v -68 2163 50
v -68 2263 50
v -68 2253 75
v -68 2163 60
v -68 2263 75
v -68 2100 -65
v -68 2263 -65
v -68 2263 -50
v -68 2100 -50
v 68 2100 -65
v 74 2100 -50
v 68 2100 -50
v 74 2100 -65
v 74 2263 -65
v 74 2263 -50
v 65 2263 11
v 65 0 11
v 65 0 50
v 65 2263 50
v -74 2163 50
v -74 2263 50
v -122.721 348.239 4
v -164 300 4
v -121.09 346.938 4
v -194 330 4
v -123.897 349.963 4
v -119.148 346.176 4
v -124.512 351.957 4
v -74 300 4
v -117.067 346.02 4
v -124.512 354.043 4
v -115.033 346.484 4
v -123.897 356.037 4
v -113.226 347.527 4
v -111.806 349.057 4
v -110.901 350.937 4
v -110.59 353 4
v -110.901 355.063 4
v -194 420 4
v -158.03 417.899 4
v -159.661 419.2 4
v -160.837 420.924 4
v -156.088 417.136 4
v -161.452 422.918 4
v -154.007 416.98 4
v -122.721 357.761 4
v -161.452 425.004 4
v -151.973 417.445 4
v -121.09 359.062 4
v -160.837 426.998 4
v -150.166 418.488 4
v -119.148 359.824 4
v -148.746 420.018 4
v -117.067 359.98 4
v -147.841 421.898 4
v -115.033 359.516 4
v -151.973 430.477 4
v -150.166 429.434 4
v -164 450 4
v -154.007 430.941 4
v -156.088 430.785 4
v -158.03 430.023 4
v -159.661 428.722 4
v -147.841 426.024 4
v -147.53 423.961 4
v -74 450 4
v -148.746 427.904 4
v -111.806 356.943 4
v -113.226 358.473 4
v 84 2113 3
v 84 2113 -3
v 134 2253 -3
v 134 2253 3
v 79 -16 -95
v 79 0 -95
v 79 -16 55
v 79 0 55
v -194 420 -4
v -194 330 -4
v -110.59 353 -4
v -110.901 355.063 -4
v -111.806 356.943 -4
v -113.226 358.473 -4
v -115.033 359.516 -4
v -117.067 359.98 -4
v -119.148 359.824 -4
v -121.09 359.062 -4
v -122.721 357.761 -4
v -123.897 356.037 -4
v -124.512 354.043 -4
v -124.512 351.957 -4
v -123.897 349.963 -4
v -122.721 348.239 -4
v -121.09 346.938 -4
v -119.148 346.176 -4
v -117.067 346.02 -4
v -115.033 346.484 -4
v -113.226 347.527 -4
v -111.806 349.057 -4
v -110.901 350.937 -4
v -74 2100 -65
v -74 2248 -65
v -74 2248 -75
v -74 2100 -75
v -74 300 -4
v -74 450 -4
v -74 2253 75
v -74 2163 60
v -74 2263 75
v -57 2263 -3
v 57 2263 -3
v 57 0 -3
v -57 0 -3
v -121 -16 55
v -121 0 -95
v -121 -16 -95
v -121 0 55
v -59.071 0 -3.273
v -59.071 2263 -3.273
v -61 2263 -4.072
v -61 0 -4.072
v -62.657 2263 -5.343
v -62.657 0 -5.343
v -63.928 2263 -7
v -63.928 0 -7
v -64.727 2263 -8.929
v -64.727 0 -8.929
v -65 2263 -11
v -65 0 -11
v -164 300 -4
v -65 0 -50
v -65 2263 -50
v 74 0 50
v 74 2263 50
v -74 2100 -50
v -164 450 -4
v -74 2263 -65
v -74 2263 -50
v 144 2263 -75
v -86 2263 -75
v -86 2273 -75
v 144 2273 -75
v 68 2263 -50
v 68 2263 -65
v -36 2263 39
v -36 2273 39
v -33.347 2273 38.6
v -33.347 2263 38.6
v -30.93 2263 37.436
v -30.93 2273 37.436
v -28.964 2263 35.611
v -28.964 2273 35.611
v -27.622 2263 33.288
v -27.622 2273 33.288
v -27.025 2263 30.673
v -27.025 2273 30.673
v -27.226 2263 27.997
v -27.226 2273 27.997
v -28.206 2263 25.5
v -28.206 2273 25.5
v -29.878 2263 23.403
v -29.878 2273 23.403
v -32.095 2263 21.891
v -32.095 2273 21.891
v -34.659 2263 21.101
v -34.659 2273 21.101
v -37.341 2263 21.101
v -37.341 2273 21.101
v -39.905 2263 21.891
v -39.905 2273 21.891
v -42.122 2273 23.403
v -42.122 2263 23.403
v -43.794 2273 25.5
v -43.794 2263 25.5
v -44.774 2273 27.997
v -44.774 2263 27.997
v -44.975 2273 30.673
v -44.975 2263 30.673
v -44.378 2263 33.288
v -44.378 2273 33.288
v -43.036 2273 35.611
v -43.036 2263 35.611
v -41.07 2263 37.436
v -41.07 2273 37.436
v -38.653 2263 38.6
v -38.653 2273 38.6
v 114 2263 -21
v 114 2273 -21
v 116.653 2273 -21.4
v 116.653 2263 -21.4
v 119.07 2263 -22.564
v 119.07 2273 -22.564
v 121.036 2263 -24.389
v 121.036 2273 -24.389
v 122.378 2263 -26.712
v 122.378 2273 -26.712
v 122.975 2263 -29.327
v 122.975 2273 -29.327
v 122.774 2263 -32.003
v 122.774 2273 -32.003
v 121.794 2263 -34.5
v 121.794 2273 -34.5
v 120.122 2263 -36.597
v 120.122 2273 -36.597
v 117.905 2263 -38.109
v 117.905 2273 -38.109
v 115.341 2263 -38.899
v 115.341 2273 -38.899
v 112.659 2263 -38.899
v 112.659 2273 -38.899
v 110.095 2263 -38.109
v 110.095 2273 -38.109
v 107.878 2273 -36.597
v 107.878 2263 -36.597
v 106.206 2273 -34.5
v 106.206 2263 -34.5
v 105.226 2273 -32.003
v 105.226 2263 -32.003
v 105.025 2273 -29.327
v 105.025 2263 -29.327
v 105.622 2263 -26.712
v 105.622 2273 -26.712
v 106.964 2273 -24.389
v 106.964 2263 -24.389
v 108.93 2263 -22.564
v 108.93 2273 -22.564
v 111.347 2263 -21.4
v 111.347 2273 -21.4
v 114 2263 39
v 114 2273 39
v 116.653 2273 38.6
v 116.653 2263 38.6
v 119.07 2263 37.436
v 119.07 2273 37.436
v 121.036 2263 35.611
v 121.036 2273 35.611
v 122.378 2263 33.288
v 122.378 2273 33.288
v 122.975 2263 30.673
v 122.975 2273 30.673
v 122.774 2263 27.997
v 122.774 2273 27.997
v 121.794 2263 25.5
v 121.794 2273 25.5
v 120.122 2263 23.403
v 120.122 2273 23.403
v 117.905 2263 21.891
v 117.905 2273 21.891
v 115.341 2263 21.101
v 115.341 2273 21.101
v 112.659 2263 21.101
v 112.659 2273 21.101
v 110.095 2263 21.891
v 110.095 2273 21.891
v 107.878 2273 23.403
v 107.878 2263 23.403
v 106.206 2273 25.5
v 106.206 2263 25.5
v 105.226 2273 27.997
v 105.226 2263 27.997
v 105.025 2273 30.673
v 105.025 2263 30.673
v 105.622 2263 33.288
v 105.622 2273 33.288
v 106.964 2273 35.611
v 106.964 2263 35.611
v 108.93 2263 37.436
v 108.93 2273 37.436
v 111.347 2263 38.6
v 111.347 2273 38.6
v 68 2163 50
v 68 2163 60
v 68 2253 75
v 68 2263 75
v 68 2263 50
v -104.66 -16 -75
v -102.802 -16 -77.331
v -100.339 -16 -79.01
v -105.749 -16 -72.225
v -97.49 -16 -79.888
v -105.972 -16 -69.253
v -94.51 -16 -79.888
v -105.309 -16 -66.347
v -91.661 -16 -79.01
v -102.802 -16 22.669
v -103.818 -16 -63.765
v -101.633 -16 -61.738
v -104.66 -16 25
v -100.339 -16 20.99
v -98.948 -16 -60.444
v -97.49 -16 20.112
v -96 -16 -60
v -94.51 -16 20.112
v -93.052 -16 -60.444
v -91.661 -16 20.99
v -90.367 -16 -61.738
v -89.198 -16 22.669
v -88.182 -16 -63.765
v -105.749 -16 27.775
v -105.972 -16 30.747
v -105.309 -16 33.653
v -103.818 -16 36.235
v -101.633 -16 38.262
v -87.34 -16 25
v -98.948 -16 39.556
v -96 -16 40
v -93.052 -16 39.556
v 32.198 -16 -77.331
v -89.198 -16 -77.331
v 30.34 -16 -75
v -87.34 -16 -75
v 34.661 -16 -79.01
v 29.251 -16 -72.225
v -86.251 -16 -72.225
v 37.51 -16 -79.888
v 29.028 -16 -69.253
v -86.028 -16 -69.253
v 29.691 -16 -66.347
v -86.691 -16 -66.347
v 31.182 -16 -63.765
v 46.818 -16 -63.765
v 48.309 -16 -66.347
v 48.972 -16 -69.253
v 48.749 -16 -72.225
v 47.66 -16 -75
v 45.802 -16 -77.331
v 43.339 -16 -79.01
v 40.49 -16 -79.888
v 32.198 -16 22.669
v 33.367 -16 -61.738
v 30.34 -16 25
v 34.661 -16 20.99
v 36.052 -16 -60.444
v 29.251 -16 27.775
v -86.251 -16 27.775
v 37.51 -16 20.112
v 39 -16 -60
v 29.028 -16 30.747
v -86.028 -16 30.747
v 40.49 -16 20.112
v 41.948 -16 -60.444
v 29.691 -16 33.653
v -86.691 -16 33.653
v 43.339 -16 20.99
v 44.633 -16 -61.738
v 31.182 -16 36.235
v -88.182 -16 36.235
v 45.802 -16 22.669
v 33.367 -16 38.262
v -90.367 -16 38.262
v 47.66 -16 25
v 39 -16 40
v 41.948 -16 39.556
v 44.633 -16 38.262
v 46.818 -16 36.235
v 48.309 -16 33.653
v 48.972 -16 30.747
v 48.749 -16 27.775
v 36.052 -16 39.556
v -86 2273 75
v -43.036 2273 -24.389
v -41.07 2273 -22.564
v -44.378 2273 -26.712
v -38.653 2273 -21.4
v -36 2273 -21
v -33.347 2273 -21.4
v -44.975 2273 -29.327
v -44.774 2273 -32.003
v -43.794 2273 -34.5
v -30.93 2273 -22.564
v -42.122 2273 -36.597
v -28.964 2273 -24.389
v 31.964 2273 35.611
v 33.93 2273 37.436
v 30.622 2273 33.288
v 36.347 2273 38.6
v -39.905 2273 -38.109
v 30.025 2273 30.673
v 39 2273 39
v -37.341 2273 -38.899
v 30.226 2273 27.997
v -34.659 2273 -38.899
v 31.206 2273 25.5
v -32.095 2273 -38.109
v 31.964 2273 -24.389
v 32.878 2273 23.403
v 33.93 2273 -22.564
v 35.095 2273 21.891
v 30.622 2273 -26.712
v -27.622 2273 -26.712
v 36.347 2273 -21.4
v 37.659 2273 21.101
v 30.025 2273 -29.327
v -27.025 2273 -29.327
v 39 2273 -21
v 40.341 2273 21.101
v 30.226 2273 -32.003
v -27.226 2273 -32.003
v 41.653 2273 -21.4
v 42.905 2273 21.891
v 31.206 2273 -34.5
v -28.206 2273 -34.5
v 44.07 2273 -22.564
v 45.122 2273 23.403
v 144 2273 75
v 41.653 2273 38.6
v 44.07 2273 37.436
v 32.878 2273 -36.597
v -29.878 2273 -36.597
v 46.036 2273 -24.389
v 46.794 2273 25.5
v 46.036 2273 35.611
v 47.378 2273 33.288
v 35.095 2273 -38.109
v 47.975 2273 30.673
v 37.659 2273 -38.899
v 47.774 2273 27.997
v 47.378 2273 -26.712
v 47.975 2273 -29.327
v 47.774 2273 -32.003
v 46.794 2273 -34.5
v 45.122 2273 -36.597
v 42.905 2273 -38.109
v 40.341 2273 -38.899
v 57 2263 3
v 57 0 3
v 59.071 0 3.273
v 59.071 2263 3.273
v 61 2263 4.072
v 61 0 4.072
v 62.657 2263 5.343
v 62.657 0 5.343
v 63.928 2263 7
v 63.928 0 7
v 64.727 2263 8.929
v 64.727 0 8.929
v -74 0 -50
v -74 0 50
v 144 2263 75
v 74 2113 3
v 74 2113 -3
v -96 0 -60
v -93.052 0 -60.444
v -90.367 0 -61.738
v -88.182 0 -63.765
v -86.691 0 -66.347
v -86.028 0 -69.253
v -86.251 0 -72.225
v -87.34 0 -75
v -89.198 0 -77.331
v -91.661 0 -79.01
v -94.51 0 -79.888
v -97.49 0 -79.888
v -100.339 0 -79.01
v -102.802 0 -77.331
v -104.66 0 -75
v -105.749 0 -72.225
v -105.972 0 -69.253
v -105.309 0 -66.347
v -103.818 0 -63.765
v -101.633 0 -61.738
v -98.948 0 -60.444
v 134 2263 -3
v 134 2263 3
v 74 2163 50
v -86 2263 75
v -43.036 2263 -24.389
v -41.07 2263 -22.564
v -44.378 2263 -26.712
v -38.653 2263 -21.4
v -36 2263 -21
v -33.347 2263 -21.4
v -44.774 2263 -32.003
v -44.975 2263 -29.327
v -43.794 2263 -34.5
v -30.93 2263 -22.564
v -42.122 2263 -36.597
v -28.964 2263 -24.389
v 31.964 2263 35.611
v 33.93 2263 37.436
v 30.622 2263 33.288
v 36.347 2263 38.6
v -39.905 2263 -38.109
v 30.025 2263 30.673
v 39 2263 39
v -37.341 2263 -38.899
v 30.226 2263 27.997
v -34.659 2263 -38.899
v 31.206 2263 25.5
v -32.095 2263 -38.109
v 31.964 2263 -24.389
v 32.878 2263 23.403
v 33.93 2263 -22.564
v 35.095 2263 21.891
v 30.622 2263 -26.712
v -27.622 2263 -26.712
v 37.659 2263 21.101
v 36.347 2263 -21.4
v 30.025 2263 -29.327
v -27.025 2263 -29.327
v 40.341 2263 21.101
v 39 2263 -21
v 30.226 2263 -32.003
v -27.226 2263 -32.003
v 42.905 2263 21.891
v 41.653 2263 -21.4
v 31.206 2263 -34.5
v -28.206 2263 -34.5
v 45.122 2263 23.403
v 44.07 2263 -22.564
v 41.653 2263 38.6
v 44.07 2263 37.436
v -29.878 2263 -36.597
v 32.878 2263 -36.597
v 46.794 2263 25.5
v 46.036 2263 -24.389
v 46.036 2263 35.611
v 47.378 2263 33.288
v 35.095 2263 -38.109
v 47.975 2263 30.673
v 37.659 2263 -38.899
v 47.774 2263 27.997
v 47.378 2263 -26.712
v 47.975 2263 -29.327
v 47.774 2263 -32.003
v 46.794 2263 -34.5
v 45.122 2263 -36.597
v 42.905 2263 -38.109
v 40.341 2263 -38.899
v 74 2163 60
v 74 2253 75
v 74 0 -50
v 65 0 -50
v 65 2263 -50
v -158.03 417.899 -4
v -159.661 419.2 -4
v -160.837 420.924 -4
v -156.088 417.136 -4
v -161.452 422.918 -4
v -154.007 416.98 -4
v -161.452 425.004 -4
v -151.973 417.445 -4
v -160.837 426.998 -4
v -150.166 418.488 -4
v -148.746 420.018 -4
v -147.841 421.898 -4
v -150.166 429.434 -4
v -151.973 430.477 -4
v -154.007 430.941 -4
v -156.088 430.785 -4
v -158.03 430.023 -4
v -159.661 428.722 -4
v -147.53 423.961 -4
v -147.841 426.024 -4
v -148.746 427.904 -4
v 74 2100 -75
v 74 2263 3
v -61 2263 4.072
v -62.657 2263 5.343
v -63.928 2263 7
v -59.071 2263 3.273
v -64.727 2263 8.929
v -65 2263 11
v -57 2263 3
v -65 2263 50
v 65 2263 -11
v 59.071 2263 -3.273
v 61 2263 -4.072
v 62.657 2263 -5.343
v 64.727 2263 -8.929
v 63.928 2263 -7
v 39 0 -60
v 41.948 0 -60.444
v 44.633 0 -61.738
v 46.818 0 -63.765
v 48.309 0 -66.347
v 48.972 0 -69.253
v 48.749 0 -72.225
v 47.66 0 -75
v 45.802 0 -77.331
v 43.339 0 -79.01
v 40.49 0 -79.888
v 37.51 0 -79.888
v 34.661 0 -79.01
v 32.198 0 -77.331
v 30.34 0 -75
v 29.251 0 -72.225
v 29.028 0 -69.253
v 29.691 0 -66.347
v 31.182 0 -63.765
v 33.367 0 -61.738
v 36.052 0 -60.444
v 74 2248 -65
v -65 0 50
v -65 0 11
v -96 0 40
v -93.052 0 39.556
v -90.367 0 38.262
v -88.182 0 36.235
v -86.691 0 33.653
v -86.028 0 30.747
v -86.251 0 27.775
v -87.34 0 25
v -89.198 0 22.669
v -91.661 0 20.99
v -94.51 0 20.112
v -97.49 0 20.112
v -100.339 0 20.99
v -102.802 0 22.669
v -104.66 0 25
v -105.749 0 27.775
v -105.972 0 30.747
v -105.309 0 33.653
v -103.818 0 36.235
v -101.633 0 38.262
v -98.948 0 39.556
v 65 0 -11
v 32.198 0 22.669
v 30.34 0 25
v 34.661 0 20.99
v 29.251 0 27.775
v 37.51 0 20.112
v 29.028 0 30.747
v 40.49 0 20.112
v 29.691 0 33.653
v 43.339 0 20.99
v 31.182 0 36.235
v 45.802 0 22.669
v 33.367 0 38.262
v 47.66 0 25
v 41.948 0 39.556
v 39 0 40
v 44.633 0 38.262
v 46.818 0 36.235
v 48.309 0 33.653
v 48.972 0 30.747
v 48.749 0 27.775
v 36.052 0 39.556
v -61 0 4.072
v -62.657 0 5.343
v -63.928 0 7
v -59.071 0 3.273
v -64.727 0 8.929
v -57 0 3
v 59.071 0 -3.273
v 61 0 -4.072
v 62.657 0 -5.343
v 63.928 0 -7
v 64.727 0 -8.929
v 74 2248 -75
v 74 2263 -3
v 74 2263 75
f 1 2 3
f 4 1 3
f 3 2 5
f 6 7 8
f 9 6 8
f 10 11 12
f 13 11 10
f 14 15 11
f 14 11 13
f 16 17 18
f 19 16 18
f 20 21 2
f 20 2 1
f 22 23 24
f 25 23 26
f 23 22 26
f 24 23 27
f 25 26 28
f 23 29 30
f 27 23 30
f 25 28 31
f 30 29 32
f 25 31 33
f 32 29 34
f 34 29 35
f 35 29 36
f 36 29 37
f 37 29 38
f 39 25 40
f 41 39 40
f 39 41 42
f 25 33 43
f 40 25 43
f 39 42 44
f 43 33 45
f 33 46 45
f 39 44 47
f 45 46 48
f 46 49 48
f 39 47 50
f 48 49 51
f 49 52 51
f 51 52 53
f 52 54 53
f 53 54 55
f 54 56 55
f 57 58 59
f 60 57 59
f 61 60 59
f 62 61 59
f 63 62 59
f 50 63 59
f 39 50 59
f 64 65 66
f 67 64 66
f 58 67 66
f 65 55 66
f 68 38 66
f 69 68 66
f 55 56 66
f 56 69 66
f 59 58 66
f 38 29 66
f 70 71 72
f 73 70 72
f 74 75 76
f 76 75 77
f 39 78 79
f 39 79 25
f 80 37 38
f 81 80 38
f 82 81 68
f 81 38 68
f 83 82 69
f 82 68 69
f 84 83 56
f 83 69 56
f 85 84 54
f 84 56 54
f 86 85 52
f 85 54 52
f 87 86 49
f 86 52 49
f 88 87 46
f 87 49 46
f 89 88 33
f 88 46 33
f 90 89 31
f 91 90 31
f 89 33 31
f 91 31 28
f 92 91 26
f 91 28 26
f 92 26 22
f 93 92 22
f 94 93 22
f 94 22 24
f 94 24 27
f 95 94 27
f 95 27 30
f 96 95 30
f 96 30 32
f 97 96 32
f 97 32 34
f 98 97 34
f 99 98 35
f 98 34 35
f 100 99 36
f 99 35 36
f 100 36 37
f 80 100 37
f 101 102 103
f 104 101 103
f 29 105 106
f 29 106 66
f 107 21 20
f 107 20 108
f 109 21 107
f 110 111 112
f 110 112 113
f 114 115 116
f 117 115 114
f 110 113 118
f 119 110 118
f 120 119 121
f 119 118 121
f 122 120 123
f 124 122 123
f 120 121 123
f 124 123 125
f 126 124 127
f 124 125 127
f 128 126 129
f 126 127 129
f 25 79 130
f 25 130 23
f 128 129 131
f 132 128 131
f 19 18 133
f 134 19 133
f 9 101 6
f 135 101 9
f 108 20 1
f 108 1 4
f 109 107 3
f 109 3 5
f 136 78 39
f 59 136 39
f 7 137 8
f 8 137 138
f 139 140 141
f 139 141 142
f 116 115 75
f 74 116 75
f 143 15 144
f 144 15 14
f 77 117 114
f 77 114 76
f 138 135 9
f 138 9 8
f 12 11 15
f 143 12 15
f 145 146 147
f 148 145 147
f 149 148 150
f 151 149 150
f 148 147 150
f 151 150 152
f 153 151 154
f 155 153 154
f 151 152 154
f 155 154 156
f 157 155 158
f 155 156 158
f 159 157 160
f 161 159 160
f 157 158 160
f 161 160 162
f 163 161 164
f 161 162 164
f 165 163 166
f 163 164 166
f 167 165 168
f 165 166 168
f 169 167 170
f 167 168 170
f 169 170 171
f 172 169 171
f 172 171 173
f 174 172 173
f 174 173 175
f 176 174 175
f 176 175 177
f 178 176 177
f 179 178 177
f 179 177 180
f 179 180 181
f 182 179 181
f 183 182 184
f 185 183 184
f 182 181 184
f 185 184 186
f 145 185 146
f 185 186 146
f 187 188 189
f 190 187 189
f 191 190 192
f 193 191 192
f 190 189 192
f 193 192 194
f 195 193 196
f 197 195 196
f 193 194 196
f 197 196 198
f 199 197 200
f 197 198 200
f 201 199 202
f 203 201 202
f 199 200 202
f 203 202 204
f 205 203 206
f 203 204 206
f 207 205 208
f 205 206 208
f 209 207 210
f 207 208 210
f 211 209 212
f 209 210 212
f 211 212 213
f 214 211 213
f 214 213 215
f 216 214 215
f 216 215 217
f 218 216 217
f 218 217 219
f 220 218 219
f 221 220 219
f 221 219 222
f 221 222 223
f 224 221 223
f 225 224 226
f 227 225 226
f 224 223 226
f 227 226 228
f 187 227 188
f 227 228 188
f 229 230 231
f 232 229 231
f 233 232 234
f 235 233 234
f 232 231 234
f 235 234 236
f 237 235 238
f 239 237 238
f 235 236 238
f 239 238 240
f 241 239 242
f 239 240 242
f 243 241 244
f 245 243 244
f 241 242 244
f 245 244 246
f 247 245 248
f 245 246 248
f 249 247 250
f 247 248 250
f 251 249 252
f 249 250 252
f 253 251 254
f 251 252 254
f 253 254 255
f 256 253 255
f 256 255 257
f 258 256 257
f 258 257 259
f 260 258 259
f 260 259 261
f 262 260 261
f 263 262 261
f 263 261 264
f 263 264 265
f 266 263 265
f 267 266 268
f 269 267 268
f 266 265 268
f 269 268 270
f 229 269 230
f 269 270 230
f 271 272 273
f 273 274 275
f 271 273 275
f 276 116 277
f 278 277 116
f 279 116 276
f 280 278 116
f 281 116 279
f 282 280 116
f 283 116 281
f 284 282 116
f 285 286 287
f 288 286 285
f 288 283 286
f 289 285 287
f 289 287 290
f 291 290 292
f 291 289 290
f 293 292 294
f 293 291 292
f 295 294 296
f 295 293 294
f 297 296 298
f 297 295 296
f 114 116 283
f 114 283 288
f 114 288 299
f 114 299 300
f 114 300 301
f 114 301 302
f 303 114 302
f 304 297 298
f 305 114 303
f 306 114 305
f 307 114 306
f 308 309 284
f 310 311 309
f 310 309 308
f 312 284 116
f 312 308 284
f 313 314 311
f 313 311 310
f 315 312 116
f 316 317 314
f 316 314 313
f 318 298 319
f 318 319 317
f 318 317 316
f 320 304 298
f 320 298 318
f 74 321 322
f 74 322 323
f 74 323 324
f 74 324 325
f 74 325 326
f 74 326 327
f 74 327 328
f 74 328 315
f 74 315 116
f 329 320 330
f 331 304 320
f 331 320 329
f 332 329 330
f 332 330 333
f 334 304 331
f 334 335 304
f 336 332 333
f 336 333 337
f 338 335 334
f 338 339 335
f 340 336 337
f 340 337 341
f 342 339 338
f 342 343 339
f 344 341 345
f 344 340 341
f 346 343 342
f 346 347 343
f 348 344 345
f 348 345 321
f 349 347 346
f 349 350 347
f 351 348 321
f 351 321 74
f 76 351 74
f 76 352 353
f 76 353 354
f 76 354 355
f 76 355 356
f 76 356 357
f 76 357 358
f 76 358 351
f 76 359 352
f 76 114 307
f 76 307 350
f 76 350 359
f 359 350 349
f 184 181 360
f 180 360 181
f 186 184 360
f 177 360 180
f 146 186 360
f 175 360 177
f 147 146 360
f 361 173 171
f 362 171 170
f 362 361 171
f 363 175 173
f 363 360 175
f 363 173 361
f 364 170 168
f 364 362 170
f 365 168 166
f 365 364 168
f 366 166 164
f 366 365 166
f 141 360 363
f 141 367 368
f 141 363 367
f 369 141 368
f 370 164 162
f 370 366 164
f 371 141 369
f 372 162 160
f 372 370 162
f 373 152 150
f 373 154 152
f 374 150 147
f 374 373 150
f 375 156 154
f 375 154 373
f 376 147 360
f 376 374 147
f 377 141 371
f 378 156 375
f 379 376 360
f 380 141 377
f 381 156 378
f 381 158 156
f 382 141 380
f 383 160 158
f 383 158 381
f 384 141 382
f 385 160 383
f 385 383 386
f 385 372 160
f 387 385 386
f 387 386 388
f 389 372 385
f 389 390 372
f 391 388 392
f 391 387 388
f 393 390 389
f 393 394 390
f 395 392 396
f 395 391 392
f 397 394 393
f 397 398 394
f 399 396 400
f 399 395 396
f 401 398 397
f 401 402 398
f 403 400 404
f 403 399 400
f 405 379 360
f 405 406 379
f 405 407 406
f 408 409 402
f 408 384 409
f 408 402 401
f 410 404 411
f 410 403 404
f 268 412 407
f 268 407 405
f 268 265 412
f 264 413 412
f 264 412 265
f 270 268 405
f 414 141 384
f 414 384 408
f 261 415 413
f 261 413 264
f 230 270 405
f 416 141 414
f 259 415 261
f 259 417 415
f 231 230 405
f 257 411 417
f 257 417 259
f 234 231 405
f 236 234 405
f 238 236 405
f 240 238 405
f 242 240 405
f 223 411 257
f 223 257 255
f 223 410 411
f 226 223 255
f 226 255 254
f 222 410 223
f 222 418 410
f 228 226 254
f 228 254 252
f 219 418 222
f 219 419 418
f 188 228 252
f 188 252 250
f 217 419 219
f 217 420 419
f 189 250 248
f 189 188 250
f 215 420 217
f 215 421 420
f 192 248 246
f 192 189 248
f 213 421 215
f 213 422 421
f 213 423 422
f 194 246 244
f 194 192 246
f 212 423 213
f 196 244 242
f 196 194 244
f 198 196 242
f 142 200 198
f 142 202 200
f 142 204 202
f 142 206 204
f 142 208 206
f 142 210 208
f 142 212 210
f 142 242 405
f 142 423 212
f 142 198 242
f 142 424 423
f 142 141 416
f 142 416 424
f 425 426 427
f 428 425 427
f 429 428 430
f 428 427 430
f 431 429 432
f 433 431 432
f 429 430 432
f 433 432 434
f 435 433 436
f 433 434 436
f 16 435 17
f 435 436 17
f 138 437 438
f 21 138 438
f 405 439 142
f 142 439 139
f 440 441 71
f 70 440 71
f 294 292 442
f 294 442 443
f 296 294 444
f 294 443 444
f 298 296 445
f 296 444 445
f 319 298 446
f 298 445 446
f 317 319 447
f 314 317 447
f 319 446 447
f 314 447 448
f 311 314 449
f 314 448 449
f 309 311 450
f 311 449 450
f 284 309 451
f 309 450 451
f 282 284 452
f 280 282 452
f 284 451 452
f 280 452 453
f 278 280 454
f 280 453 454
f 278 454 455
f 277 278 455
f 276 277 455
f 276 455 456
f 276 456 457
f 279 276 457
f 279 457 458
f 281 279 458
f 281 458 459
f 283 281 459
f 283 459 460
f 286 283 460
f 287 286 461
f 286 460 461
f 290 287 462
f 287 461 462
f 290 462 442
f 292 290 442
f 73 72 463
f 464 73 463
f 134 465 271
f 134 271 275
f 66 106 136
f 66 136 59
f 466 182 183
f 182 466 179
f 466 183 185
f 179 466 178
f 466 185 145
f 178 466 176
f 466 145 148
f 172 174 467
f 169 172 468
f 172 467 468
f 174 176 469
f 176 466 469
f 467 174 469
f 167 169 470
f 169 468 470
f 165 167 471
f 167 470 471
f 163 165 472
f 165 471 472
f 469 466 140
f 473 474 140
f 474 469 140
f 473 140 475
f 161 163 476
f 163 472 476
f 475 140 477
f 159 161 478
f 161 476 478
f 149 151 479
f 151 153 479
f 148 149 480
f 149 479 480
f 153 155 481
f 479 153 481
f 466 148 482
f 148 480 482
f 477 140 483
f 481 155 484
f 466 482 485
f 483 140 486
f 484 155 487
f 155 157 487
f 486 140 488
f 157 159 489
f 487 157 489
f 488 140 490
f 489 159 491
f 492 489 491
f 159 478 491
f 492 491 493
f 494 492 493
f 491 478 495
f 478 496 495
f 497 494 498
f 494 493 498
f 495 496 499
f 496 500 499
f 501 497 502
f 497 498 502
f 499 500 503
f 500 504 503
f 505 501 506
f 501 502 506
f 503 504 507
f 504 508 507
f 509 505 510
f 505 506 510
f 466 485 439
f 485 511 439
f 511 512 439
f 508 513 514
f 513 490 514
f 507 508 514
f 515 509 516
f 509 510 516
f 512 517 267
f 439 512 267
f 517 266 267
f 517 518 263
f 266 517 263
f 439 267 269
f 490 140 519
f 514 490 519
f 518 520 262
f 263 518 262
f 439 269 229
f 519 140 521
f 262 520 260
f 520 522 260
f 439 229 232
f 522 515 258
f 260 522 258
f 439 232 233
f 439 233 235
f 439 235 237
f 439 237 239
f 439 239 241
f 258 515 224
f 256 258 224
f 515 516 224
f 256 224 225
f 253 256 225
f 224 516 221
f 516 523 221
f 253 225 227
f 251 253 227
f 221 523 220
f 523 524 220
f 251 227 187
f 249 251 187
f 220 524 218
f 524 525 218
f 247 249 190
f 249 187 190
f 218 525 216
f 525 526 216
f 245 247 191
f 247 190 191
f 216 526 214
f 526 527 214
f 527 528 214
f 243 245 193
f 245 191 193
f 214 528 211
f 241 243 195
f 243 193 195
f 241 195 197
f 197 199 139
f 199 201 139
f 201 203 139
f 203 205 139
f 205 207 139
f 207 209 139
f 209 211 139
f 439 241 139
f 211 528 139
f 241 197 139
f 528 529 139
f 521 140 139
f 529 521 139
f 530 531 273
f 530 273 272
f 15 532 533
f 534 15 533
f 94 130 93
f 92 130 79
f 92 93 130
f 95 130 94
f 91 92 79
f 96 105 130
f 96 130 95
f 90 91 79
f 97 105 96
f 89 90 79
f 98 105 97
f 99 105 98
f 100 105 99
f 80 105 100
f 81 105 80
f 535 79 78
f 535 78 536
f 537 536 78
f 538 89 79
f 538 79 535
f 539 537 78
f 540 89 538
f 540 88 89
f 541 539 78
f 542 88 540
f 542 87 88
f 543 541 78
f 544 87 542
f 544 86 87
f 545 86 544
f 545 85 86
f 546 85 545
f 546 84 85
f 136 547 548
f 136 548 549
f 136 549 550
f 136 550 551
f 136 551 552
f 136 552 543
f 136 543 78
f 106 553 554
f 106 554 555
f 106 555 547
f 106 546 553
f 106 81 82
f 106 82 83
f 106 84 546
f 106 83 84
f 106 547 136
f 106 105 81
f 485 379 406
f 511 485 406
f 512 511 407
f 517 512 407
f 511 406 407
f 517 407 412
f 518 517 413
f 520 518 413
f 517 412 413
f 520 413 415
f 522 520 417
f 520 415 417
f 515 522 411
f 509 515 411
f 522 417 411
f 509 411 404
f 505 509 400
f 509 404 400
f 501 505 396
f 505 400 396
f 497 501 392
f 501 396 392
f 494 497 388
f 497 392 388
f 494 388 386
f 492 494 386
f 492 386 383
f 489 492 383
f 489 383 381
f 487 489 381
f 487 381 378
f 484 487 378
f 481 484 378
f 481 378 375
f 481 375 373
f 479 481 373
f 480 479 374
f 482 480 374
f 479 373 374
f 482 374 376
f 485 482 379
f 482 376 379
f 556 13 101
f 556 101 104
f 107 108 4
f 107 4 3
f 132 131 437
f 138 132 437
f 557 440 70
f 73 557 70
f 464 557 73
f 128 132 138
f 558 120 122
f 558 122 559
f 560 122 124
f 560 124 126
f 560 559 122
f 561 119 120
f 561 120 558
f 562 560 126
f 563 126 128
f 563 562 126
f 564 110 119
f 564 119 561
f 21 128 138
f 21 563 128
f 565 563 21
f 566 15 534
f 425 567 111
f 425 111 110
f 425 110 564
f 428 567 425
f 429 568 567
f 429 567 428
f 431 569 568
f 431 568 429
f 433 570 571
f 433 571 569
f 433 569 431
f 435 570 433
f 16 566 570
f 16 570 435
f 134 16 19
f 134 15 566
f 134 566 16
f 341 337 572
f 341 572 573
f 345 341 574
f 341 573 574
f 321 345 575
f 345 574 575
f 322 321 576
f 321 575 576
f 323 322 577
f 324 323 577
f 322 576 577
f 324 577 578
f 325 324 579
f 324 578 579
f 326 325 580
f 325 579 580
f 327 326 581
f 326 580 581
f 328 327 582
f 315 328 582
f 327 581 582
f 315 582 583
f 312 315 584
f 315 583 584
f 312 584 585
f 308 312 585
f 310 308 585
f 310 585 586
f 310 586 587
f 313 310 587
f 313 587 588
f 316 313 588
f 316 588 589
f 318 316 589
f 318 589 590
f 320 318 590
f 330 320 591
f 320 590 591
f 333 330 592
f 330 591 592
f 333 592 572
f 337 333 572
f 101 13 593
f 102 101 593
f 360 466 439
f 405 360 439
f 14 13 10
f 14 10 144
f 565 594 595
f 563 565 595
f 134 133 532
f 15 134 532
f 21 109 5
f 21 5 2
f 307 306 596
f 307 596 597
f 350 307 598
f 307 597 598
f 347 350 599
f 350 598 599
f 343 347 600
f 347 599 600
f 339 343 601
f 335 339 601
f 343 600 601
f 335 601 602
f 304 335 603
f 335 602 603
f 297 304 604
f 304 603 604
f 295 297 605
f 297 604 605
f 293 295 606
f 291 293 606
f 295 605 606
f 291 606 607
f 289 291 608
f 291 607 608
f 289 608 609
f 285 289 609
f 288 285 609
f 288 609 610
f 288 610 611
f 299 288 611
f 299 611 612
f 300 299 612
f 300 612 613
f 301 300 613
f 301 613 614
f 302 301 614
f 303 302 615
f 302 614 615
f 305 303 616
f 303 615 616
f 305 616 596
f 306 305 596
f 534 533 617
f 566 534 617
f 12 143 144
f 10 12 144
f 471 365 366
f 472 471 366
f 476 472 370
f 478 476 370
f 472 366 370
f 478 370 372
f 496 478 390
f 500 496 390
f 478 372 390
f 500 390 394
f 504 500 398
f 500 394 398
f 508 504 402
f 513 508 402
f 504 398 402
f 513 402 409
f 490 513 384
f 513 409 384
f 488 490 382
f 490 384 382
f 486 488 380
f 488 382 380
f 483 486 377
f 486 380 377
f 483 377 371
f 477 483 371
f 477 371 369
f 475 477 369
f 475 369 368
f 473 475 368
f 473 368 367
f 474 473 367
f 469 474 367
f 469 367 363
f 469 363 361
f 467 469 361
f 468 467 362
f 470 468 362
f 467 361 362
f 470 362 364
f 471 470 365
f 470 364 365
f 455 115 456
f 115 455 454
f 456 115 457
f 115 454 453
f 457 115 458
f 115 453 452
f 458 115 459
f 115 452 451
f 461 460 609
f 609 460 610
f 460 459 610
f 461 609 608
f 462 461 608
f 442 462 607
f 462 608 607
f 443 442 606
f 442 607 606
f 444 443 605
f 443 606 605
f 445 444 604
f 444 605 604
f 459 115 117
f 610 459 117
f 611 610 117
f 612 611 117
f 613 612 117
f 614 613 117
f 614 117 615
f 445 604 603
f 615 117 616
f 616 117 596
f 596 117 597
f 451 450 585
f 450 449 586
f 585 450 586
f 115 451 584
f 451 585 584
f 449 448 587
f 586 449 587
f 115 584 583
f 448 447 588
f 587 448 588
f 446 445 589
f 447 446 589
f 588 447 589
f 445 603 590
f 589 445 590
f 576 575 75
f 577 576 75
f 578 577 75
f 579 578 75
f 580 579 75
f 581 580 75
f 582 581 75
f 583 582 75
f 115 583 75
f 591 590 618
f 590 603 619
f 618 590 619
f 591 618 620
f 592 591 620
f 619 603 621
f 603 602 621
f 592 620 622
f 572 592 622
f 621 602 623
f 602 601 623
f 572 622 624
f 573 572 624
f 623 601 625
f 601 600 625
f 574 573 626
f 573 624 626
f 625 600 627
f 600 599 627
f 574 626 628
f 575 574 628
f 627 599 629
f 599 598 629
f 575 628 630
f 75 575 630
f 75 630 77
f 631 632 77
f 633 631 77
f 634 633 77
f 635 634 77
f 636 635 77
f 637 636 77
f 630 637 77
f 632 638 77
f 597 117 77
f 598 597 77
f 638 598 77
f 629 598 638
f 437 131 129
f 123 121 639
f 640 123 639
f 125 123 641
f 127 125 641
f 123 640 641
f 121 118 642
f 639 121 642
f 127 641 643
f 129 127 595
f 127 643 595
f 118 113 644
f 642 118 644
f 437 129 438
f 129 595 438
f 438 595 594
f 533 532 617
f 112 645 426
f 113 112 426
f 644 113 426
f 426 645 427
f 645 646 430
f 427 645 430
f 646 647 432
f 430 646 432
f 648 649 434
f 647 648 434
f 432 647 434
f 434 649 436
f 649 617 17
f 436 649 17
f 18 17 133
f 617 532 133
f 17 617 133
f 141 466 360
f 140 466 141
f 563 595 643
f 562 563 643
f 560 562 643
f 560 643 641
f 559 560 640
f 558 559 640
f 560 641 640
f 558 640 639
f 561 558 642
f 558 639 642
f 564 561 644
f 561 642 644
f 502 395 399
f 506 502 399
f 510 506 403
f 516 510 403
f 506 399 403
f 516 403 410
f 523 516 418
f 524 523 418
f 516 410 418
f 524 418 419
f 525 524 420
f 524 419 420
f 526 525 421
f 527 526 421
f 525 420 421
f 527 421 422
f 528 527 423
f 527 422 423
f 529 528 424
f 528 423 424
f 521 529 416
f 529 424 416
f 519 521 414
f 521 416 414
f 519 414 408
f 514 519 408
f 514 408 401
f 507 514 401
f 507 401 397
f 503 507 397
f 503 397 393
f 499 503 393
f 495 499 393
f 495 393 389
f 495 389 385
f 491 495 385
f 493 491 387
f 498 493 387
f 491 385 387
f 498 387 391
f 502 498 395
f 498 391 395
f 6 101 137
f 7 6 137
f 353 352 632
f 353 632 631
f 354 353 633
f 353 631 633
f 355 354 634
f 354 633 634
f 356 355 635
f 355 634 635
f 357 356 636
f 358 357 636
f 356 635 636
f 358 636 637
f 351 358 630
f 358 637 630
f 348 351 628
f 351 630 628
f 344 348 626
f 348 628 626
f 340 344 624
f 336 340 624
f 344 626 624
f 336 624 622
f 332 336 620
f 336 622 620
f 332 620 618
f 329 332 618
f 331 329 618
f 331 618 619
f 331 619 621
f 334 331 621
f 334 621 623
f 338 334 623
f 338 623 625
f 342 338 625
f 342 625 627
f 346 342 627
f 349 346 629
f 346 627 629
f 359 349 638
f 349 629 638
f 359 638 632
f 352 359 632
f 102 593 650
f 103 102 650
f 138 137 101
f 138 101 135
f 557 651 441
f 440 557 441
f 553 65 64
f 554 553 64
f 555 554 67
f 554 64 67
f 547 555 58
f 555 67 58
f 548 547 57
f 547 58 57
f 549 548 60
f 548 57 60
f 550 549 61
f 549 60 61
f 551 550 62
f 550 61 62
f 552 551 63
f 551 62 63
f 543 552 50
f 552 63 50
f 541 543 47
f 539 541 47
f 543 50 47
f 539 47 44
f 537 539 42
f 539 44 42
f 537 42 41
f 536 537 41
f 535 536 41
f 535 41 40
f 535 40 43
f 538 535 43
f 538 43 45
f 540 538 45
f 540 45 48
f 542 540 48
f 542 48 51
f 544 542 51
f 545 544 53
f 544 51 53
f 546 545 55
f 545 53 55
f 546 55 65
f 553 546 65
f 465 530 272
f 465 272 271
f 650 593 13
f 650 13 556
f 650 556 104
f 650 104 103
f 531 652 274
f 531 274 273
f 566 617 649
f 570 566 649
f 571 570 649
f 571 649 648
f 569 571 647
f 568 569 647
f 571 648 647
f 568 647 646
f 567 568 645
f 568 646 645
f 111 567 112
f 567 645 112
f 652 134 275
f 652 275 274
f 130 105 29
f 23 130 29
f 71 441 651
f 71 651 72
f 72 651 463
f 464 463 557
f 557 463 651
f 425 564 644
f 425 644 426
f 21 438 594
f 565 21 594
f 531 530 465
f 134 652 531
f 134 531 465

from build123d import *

# Parameters (mm, degrees)
H_HM150_100_5_DEPTH = 2263
SKETCH_12_W         = 200
SKETCH_12_H         = 150
EXTRUDE_1_DEPTH     = 16
SKETCH_13_W         = 230
SKETCH_13_H         = 150
EXTRUDE_2_DEPTH     = 10
SKETCH_14_R         = 9
CUT_EXTRUDE_1_DEPTH = 10
SKETCH_16_W         = 8
SKETCH_16_H         = 150
EXTRUDE_4_DEPTH     = 120
CHAMFER_1_SIZE      = 30
SKETCH_17_R         = 7
CUT_EXTRUDE_2_DEPTH = 8
EXTRUDE_5_DEPTH     = 6
EXTRUDE_6_DEPTH     = 6
SKETCH_19_W         = 15
SKETCH_19_H         = 163
EXTRUDE_6_2_DEPTH   = 6
EXTRUDE_7_DEPTH     = 6
SKETCH_20_W         = 15
SKETCH_20_H         = 163
EXTRUDE_7_2_DEPTH   = 6
SKETCH_21_W         = 10
SKETCH_21_H         = 148
EXTRUDE_8_DEPTH     = 148
SKETCH_22_R         = 10
CUT_EXTRUDE_3_DEPTH = 16


with BuildPart() as part:
    # 草图11 → H型钢 HM150×100(5) (new body)
    with BuildSketch(Plane.ZX):
        with BuildLine():
            Line((-50, -74), (50, -74))
            Line((50, -74), (50, -65))
            Line((50, -65), (11, -65))
            ThreePointArc((11, -65), (5.343145751, -62.656854249), (3, -57))
            Line((3, -57), (3, 57))
            ThreePointArc((3, 57), (5.343145751, 62.656854249), (11, 65))
            Line((11, 65), (50, 65))
            Line((50, 65), (50, 74))
            Line((50, 74), (-50, 74))
            Line((-50, 74), (-50, 65))
            Line((-50, 65), (-11, 65))
            ThreePointArc((-11, 65), (-5.343145751, 62.656854249), (-3, 57))
            Line((-3, 57), (-3, -57))
            ThreePointArc((-3, -57), (-5.343145751, -62.656854249), (-11, -65))
            Line((-11, -65), (-50, -65))
            Line((-50, -65), (-50, -74))
        make_face()
    extrude(amount=H_HM150_100_5_DEPTH)


with BuildPart() as body_2:
    # 草图12 → 凸台-拉伸1 (new body)
    with BuildSketch(Plane.XZ):
        with Locations((-21, -20)):
            Rectangle(SKETCH_12_W, SKETCH_12_H)
    extrude(amount=EXTRUDE_1_DEPTH)

    # 草图22 → 切除-拉伸3 (cut)
    with BuildSketch(Plane(origin=(0, 0, 0), x_dir=(1, 0, 0), z_dir=(0, 1, 0))):
        with Locations(Location((-96, -30, 0), (0, 0, 270))):
            Circle(SKETCH_22_R)
        with Locations(Location((39, -30, 0), (0, 0, 270))):
            Circle(SKETCH_22_R)
        with Locations(Location((-96, 70, 0), (0, 0, 270))):
            Circle(SKETCH_22_R)
        with Locations(Location((39, 70, 0), (0, 0, 270))):
            Circle(SKETCH_22_R)
    extrude(amount=-CUT_EXTRUDE_3_DEPTH, mode=Mode.SUBTRACT)


with BuildPart() as body_3:
    # 草图13 → 凸台-拉伸2 (new body)
    with BuildSketch(Plane(origin=(0, 2263, 0), x_dir=(1, 0, 0), z_dir=(0, 1, 0))):
        with Locations((29, 0)):
            Rectangle(SKETCH_13_W, SKETCH_13_H)
    extrude(amount=EXTRUDE_2_DEPTH)

    # 草图14 → 切除-拉伸1 (cut)
    with BuildSketch(Plane(origin=(0, 2273, 0), x_dir=(1, 0, 0), z_dir=(0, 1, 0))):
        with Locations(Location((114, 30, 0), (0, 0, 270))):
            Circle(SKETCH_14_R)
        with Locations(Location((114, -30, 0), (0, 0, 270))):
            Circle(SKETCH_14_R)
        with Locations(Location((39, -30, 0), (0, 0, 270))):
            Circle(SKETCH_14_R)
        with Locations(Location((39, 30, 0), (0, 0, 270))):
            Circle(SKETCH_14_R)
        with Locations(Location((-36, 30, 0), (0, 0, 270))):
            Circle(SKETCH_14_R)
        with Locations(Location((-36, -30, 0), (0, 0, 270))):
            Circle(SKETCH_14_R)
    extrude(amount=-CUT_EXTRUDE_1_DEPTH, mode=Mode.SUBTRACT)


with BuildPart() as body_4:
    # 草图16 → 凸台-拉伸4 (new body)
    with BuildSketch(Plane.ZY.offset(74)):
        with Locations((0, 375)):
            Rectangle(SKETCH_16_W, SKETCH_16_H)
    extrude(amount=EXTRUDE_4_DEPTH)

    # 倒角1
    chamfer_1_edges = [body_4.edges().sort_by_distance(p)[0] for p in [
        (-194, 450, 0),
        (-194, 300, 0),
    ]]
    chamfer(chamfer_1_edges, length=CHAMFER_1_SIZE)

    # 草图17 → 切除-拉伸2 (cut)
    with BuildSketch(Plane.XY.offset(4)):
        with Locations((-154.529942738, 423.960866654)):
            Circle(SKETCH_17_R)
        with Locations((-117.590053679, 353)):
            Circle(SKETCH_17_R)
    extrude(amount=-CUT_EXTRUDE_2_DEPTH, mode=Mode.SUBTRACT)


with BuildPart() as body_5:
    # 草图18 → 凸台-拉伸5 (new body)
    with BuildSketch(Plane(origin=(0, 0, -3), x_dir=(-1, 0, 0), z_dir=(0, 0, -1))):
        Polygon((-74, 2263), (-74, 2113), (-84, 2113), (-134, 2253), (-134, 2263), align=None)
    extrude(amount=-EXTRUDE_5_DEPTH)


with BuildPart() as body_6:
    # 草图19 → 凸台-拉伸6 (new body)
    with BuildSketch(Plane(origin=(74, 0, 0), x_dir=(0, 0, -1), z_dir=(1, 0, 0))):
        Polygon((-50, 2263), (-75, 2263), (-75, 2253), (-60, 2163), (-50, 2163), align=None)
    extrude(amount=-EXTRUDE_6_DEPTH)


with BuildPart() as body_7:
    # 草图19 → Extrude 6 2 (new body)
    with BuildSketch(Plane(origin=(74, 0, 0), x_dir=(0, 0, -1), z_dir=(1, 0, 0))):
        with Locations((57.5, 2181.5)):
            Rectangle(SKETCH_19_W, SKETCH_19_H)
    extrude(amount=-EXTRUDE_6_2_DEPTH)


with BuildPart() as body_8:
    # 草图20 → 凸台-拉伸7 (new body)
    with BuildSketch(Plane.ZY.offset(74)):
        Polygon((50, 2263), (50, 2163), (60, 2163), (75, 2253), (75, 2263), align=None)
    extrude(amount=-EXTRUDE_7_DEPTH)


with BuildPart() as body_9:
    # 草图20 → Extrude 7 2 (new body)
    with BuildSketch(Plane.ZY.offset(74)):
        with Locations((-57.5, 2181.5)):
            Rectangle(SKETCH_20_W, SKETCH_20_H)
    extrude(amount=-EXTRUDE_7_2_DEPTH)


with BuildPart() as body_10:
    # 草图21 → 凸台-拉伸8 (new body)
    with BuildSketch(Plane(origin=(74, 0, 0), x_dir=(0, 0, -1), z_dir=(1, 0, 0))):
        with Locations((70, 2174)):
            Rectangle(SKETCH_21_W, SKETCH_21_H)
    extrude(amount=-EXTRUDE_8_DEPTH)


solid = Compound([part.part, body_2.part, body_3.part, body_4.part, body_5.part, body_6.part, body_7.part, body_8.part, body_9.part, body_10.part])
